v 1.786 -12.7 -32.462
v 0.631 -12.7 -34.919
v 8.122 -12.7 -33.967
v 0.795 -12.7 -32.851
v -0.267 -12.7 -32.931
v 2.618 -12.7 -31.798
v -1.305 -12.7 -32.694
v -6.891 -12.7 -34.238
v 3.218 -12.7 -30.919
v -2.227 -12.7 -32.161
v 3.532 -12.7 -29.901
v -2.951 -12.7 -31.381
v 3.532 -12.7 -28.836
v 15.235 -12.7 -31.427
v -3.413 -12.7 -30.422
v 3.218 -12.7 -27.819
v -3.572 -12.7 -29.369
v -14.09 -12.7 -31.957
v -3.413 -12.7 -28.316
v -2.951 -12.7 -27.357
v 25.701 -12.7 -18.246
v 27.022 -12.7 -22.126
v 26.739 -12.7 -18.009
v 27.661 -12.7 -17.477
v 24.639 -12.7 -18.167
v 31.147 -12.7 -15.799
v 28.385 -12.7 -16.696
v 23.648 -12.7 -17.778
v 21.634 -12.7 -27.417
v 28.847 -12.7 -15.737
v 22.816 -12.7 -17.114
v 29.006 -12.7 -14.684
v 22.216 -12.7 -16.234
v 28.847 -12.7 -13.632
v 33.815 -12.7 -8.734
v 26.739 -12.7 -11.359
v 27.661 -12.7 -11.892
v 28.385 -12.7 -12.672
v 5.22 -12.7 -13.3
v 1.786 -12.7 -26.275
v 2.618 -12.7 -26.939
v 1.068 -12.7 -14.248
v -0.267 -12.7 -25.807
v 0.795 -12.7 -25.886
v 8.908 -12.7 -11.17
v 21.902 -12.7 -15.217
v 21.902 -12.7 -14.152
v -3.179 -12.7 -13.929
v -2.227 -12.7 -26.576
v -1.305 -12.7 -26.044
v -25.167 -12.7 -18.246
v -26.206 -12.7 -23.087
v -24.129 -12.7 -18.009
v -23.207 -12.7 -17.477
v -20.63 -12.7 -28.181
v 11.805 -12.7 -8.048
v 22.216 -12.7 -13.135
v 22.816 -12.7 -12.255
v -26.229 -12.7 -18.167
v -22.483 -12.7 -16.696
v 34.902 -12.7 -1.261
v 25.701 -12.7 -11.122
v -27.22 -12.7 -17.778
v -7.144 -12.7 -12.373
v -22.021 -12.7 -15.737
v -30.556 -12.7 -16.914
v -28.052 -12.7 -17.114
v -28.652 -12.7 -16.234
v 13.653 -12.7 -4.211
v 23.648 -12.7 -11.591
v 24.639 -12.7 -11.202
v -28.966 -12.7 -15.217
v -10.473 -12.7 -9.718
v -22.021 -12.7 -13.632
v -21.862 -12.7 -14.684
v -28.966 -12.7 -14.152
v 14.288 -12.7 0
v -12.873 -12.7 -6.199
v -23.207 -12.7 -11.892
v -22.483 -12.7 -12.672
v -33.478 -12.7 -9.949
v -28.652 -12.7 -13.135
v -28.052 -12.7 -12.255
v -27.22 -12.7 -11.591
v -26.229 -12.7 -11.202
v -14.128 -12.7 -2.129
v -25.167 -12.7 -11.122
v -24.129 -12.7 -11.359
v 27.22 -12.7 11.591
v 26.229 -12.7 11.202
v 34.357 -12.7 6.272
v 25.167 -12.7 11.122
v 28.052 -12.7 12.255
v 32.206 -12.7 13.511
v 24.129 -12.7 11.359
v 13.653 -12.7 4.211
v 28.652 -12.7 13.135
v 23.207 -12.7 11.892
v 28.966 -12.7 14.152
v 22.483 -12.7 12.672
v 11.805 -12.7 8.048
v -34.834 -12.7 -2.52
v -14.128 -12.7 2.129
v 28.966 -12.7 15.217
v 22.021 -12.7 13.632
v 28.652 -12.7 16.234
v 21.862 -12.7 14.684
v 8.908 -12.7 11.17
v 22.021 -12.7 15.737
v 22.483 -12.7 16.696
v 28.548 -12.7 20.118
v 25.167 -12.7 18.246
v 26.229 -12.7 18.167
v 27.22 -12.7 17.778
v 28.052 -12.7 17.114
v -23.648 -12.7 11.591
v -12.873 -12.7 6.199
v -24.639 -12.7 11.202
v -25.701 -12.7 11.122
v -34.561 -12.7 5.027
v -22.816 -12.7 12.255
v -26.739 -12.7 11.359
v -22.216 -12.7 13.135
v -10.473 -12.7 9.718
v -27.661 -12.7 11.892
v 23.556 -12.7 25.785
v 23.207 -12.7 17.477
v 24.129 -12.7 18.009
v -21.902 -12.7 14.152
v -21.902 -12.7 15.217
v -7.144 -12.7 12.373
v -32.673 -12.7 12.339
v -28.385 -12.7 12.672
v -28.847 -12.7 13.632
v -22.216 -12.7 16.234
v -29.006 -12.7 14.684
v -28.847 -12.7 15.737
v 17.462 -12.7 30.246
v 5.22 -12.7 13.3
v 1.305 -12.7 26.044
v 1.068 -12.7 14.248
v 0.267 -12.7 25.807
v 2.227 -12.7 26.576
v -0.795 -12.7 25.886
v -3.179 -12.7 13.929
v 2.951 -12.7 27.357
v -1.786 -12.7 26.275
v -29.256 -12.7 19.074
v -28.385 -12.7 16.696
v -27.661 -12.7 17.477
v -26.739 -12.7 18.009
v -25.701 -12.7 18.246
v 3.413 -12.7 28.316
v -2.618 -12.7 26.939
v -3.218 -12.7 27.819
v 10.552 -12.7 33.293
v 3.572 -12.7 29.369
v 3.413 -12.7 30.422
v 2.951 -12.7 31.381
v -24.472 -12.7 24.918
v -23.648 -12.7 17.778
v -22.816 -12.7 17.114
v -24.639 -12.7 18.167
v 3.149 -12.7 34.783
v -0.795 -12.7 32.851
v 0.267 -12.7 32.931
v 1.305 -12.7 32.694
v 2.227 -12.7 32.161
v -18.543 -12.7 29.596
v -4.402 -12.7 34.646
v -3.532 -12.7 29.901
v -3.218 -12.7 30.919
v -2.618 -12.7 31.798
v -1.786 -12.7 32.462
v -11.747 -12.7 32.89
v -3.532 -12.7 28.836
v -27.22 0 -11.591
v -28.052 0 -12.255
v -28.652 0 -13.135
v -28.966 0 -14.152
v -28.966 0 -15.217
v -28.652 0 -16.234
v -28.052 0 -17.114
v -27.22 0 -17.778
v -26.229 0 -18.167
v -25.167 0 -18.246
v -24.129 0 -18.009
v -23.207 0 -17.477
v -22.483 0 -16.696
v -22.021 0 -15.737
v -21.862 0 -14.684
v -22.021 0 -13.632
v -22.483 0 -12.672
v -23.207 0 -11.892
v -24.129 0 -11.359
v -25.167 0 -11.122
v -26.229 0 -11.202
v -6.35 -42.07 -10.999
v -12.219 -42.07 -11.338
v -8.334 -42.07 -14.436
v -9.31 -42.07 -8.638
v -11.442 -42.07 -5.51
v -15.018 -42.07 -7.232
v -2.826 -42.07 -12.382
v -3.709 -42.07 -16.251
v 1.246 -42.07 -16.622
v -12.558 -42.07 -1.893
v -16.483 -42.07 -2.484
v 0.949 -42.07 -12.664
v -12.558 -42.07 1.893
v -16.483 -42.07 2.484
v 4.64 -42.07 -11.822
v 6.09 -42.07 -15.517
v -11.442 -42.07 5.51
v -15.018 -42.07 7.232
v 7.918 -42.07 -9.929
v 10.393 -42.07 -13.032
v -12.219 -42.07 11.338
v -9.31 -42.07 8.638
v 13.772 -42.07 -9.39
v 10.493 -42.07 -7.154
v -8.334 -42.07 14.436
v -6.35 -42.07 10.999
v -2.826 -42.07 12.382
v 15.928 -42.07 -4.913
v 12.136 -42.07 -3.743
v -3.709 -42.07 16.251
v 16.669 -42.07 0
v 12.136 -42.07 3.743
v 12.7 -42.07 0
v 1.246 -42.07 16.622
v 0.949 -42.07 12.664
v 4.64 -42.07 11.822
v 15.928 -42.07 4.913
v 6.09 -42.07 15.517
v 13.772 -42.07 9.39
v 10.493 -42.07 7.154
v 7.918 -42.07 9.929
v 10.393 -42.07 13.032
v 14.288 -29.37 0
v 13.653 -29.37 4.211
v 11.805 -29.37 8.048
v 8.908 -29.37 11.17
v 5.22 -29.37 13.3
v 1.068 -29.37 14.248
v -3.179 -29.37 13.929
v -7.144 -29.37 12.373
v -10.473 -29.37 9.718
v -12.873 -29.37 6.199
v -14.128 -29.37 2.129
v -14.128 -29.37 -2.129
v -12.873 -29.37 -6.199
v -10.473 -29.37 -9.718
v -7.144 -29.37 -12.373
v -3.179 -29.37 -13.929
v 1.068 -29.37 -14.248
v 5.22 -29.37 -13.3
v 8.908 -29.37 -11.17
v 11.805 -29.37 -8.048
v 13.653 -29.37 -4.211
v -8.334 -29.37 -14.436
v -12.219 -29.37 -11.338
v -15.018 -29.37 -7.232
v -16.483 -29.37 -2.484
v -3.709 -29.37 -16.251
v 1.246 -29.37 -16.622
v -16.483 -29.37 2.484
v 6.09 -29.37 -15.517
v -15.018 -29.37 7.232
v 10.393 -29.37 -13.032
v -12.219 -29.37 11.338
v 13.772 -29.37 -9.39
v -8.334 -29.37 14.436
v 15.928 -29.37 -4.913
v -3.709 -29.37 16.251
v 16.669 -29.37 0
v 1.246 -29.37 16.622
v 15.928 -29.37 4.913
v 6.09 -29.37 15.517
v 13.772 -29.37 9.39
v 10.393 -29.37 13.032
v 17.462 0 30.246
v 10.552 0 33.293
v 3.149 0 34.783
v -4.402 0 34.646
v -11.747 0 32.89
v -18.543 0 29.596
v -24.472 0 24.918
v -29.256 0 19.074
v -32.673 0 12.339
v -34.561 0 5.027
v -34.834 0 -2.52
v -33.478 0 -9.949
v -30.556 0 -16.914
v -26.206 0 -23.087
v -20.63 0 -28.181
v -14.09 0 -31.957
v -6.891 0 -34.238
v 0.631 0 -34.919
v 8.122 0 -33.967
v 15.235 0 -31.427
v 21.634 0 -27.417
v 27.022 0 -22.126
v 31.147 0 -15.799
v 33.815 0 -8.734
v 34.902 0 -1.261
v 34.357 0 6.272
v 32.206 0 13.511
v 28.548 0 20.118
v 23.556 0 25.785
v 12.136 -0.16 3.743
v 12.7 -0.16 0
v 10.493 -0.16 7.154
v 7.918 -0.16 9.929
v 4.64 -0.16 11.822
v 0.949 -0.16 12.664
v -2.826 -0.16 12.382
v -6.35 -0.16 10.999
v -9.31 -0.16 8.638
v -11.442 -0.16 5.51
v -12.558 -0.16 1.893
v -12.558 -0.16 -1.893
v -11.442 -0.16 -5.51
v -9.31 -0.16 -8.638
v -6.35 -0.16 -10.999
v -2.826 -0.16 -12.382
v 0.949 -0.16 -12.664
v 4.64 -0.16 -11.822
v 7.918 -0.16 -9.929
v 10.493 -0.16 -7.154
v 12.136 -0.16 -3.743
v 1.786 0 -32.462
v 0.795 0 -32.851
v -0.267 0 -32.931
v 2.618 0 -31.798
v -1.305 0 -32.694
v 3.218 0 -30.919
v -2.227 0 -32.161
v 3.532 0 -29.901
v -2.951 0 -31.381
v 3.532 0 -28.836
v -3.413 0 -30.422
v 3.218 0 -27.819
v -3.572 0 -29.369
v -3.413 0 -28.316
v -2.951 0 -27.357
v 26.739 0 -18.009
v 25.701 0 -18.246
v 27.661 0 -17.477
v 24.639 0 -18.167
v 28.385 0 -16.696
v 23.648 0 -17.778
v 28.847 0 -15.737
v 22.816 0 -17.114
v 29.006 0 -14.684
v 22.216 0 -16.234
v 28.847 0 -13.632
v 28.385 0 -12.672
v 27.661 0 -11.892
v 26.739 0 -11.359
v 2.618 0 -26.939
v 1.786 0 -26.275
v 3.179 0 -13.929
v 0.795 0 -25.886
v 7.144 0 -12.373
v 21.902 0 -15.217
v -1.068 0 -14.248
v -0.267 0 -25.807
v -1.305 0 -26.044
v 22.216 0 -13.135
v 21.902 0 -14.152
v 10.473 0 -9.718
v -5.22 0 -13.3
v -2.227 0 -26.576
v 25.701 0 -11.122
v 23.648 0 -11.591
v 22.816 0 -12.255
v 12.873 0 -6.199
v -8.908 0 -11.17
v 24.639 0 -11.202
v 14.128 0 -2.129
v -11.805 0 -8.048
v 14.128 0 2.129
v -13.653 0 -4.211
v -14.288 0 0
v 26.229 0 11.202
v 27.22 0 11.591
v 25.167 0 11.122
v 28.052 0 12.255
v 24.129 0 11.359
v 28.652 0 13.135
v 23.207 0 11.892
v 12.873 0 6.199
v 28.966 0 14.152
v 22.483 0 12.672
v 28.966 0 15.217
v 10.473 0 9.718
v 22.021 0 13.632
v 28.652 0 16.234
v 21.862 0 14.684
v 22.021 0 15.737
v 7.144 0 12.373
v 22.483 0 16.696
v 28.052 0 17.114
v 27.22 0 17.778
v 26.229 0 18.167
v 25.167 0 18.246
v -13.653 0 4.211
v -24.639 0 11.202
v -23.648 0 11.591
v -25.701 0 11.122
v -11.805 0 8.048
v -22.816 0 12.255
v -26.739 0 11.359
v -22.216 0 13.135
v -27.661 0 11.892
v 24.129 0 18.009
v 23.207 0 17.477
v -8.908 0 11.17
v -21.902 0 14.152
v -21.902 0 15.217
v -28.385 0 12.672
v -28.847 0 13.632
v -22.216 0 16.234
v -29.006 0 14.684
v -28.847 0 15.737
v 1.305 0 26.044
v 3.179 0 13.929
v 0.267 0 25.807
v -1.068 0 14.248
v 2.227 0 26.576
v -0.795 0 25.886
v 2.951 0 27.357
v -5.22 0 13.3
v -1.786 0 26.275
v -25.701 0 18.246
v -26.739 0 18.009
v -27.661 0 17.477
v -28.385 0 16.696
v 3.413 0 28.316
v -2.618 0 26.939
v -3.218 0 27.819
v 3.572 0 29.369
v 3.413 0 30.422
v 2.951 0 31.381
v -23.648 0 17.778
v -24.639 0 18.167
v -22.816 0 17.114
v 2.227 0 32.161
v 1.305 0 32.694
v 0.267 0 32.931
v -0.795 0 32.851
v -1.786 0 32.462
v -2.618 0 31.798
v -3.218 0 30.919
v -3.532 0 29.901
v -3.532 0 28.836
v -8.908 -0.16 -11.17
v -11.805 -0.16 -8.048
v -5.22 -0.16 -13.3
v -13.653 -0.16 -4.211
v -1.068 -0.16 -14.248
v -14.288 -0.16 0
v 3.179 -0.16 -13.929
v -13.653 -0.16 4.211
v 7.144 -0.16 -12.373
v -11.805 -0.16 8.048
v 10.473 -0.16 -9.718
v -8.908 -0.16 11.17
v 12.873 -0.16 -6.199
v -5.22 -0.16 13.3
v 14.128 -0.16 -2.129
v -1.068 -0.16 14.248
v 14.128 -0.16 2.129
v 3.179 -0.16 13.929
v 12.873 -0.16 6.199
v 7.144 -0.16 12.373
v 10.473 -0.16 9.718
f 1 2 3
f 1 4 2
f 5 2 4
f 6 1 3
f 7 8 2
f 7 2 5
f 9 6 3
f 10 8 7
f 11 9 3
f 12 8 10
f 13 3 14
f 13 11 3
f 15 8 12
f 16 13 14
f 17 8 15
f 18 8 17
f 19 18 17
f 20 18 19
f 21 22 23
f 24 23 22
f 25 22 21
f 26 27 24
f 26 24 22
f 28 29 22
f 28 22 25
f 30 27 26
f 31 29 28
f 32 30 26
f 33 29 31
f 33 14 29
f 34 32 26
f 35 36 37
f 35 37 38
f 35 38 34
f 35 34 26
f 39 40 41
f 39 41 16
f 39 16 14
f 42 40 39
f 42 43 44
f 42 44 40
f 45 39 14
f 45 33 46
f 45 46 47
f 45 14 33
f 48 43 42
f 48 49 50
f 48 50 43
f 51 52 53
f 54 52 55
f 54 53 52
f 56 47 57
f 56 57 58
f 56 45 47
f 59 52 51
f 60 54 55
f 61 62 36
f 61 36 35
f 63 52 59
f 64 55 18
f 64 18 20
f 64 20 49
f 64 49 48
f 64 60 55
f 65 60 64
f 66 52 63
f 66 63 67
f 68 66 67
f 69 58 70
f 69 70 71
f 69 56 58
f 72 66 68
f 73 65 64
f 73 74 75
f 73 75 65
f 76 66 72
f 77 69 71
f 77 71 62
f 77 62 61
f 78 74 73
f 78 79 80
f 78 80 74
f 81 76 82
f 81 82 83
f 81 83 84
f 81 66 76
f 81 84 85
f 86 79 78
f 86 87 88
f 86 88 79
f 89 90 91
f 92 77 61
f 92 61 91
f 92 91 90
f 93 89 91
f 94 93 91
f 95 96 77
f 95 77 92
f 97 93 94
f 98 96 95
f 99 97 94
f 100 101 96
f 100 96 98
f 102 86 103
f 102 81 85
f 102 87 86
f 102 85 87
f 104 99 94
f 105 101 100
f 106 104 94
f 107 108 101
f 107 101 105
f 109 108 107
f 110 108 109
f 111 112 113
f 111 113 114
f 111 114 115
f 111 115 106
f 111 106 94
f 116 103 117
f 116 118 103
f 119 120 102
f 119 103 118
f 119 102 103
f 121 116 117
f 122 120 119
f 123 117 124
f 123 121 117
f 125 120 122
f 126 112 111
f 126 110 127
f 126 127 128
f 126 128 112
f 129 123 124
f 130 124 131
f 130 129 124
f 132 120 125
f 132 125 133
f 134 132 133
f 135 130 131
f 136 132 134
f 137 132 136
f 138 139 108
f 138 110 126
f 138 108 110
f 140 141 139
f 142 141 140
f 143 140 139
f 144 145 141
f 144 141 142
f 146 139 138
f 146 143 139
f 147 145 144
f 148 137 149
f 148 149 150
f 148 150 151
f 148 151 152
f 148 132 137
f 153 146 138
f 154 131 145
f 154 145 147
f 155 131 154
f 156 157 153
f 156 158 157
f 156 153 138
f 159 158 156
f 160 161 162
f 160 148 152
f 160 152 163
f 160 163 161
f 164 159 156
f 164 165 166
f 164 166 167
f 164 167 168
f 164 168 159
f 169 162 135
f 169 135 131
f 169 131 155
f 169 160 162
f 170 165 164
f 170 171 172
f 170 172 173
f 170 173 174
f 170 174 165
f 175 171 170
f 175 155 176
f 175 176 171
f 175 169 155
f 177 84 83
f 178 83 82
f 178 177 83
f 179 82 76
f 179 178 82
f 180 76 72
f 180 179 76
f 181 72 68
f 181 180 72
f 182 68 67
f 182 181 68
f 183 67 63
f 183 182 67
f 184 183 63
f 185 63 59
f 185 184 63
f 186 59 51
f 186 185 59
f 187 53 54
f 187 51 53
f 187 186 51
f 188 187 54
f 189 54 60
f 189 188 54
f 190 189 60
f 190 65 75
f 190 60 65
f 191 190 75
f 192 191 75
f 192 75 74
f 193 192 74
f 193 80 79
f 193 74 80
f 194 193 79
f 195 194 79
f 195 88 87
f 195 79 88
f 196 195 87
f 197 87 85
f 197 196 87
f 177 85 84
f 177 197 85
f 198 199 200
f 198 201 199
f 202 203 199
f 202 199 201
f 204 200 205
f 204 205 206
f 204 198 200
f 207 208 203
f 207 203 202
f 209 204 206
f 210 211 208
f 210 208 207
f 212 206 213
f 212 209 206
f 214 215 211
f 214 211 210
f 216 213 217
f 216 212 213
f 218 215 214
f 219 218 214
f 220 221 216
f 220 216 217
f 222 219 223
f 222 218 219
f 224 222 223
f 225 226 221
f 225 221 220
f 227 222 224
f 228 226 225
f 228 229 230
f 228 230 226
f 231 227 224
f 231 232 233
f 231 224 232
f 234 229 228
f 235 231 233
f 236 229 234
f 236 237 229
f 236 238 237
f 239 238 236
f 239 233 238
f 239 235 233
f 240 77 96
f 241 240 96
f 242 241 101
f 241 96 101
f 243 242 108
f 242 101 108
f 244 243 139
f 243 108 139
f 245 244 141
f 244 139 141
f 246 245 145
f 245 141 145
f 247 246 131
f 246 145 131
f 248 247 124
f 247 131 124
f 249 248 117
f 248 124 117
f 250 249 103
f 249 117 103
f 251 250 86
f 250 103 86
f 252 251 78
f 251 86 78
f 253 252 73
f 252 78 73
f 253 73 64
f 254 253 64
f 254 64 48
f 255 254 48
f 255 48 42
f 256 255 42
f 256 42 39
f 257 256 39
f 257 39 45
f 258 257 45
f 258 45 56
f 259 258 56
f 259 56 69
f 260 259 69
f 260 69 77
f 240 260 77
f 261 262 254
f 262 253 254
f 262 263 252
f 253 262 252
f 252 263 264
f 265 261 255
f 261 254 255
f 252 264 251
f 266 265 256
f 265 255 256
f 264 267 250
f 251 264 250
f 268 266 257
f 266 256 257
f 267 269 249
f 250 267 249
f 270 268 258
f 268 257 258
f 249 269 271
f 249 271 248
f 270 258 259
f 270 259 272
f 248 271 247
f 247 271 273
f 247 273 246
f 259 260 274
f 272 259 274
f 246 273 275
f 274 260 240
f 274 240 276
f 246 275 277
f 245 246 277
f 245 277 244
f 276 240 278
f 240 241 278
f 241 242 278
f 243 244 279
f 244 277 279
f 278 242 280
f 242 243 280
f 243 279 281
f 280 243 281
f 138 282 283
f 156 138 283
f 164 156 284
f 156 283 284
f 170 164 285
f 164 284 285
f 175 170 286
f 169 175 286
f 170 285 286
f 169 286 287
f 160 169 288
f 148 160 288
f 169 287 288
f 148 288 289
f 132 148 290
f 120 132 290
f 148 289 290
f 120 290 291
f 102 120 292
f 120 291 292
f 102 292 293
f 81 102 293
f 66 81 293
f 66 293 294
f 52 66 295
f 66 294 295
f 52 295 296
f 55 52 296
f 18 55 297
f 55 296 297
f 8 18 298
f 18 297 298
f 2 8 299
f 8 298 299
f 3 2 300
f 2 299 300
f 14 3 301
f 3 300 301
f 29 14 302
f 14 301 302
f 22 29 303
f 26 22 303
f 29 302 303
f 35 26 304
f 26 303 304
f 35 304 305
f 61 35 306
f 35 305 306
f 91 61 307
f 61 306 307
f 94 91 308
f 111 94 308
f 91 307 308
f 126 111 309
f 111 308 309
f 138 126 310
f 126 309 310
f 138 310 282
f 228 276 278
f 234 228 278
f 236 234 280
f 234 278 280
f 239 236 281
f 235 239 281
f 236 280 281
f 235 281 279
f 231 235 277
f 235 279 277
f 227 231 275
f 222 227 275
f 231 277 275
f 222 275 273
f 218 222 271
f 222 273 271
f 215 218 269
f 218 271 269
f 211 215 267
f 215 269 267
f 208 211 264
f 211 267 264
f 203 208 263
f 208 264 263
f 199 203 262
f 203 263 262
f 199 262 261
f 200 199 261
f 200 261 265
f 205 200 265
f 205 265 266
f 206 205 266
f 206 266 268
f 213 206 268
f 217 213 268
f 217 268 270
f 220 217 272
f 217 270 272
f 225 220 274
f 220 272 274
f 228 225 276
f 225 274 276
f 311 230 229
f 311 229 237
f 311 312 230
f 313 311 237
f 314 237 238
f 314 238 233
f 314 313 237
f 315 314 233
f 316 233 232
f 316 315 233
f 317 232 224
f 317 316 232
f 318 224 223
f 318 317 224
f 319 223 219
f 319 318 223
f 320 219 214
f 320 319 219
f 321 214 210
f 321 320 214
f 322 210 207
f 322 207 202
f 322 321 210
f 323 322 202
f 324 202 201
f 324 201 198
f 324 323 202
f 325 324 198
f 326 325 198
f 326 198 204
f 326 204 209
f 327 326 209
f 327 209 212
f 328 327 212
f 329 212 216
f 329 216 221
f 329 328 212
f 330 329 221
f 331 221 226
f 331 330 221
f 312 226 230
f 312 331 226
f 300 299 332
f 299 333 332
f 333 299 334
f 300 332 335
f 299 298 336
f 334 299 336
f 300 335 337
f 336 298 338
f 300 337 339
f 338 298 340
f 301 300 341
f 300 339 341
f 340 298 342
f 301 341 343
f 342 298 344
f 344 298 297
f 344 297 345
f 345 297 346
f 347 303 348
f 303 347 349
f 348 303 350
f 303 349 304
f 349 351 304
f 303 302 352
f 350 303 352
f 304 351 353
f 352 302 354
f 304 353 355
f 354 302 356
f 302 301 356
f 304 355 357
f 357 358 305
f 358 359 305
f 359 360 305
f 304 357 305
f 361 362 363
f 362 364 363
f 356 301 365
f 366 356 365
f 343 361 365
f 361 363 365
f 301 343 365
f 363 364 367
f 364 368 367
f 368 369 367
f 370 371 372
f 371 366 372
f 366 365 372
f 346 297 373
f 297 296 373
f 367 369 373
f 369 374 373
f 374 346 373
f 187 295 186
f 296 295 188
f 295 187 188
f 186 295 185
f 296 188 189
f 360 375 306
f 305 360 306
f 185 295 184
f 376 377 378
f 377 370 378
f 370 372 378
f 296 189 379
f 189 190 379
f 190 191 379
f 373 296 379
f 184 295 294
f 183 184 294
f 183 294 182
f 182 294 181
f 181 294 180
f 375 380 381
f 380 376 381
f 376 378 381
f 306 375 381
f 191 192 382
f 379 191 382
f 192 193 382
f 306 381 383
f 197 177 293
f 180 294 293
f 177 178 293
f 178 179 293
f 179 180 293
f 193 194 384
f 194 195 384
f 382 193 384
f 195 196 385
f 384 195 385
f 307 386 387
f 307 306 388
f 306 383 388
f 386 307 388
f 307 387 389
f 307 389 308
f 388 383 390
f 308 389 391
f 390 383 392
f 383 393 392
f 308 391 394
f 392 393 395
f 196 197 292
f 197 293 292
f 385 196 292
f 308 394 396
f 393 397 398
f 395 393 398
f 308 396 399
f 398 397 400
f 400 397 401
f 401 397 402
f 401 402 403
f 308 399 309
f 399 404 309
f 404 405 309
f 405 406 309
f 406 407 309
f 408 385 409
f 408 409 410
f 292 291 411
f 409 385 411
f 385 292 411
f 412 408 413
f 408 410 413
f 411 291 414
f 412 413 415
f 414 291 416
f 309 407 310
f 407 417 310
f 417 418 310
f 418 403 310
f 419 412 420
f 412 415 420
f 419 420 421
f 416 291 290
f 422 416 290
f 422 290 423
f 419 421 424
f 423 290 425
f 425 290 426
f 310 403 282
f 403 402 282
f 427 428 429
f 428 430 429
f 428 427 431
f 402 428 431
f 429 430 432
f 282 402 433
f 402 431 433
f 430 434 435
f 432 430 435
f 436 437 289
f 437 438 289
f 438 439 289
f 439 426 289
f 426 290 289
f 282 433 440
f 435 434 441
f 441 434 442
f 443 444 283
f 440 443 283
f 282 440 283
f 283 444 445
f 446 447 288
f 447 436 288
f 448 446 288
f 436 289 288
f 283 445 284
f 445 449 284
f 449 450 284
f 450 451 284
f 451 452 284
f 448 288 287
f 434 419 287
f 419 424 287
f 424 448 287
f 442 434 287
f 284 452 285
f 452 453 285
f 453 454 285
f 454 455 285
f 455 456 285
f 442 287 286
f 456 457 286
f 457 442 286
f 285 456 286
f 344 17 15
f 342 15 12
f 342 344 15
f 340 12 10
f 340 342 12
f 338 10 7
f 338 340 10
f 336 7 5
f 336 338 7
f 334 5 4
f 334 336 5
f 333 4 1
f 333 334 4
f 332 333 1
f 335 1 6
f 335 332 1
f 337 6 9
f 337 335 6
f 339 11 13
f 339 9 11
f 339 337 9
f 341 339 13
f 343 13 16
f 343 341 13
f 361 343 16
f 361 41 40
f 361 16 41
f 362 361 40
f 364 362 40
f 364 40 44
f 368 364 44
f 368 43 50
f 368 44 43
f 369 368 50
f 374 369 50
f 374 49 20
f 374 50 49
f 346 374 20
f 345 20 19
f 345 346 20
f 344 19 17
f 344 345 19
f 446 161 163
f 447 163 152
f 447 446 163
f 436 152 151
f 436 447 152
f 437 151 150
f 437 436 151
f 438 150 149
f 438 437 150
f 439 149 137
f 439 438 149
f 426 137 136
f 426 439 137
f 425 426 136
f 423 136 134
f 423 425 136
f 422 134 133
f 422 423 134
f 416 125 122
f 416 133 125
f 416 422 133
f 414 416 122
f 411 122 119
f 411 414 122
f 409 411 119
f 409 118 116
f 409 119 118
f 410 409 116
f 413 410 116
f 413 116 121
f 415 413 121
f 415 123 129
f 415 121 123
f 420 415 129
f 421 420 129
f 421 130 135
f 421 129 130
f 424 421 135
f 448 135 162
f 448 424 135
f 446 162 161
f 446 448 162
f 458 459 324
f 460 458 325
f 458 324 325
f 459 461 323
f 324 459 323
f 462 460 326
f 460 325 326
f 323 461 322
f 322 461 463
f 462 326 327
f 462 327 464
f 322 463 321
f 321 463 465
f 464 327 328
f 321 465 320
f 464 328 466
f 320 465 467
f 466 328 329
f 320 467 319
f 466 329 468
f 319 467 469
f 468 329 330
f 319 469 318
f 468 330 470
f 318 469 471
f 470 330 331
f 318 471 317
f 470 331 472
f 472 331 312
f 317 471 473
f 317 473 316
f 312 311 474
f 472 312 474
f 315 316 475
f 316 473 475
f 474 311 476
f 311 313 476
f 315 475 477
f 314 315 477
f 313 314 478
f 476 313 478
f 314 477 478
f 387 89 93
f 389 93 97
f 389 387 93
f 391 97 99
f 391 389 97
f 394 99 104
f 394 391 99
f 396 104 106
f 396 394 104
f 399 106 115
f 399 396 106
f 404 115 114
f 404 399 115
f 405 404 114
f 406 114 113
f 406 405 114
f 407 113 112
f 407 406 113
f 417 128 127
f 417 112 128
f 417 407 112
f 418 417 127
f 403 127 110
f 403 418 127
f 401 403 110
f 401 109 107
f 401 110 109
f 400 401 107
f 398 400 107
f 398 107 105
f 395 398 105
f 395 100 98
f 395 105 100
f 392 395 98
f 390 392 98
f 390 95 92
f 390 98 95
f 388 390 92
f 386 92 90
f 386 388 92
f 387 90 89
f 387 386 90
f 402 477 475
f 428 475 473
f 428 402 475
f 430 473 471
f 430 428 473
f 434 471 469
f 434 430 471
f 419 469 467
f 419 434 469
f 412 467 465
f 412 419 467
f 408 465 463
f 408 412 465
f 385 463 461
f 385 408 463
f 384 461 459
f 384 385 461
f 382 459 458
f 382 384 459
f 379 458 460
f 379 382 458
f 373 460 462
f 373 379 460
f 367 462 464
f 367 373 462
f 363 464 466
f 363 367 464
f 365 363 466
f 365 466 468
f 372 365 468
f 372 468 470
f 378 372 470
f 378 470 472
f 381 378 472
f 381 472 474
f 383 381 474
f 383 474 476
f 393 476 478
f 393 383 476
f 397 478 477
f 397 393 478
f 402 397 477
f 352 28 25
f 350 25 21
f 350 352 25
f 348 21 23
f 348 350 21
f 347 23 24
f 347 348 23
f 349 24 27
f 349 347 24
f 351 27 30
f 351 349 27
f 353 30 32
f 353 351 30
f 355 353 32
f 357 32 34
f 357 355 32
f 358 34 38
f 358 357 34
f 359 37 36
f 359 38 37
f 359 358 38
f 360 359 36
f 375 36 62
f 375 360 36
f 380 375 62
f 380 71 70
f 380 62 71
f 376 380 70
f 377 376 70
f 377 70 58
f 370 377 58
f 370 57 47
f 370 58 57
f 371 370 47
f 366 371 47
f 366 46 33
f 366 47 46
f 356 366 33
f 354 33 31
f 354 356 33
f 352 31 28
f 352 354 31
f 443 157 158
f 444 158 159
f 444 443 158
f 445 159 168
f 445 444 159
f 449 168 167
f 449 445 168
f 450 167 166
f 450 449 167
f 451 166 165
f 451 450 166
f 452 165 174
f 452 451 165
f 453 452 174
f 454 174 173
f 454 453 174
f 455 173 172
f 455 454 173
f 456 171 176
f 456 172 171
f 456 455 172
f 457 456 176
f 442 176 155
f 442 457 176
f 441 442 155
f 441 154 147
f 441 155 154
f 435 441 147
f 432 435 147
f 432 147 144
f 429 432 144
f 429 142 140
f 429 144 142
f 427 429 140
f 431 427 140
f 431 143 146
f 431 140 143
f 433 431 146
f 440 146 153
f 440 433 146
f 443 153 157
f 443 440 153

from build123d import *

# Parameters (mm, degrees)
SKETCH015_R            = 14.2875
SKETCH015_R_2          = 12.7
PAD015_DEPTH           = 29.21
SKETCH016_R            = 16.66875
SKETCH016_R_2          = 12.7
PAD016_DEPTH           = 12.7
SKETCH014_R            = 3.571875
PAD014_DEPTH           = 13
SKETCH013_R            = 34.925
SKETCH013_R_2          = 14.2875
PAD013_DEPTH           = 12.7
CUT006_PLACEMENT_ANGLE = 60
CUT007_PLACEMENT_ANGLE = 60
CUT008_PLACEMENT_ANGLE = 60
CUT009_PLACEMENT_ANGLE = 60
CUT010_PLACEMENT_ANGLE = 60


with BuildPart() as body015:
    # Sketch015 → Pad015 (new body)
    with BuildSketch(Plane.XZ):
        Circle(SKETCH015_R)
        Circle(SKETCH015_R_2, mode=Mode.SUBTRACT)
    extrude(amount=PAD015_DEPTH)


with BuildPart() as body015_1:
    # Body015 placement: moved
    add(body015.part.moved(Location((0, -0.16, 0))))


with BuildPart() as body016:
    # Sketch016 → Pad016 (new body)
    with BuildSketch(Plane.XZ):
        Circle(SKETCH016_R)
        Circle(SKETCH016_R_2, mode=Mode.SUBTRACT)
    extrude(amount=PAD016_DEPTH)


with BuildPart() as body016_1:
    # Body016 placement: moved
    add(body016.part.moved(Location((0, -29.37, 0))))


with BuildPart() as body014:
    # Sketch014 → Pad014 (new body)
    with BuildSketch(Plane.XZ):
        with Locations((0, 29.36875)):
            Circle(SKETCH014_R)
    extrude(amount=PAD014_DEPTH)


with BuildPart() as fusion001:
    # Sketch013 → Pad013 (new body)
    with BuildSketch(Plane.XZ):
        Circle(SKETCH013_R)
        Circle(SKETCH013_R_2, mode=Mode.SUBTRACT)
    extrude(amount=PAD013_DEPTH)

    # Cut006: cut Body014
    add(body014.part, mode=Mode.SUBTRACT)


with BuildPart() as fusion001_1:
    # Cut006 placement: moved
    add(fusion001.part.rotate(Axis((0, 0, 0), (0, 1, 0)), CUT006_PLACEMENT_ANGLE))

    # Cut007: cut Body014
    add(body014.part, mode=Mode.SUBTRACT)


with BuildPart() as fusion001_2:
    # Cut007 placement: moved
    add(fusion001_1.part.rotate(Axis((0, 0, 0), (0, 1, 0)), CUT007_PLACEMENT_ANGLE))

    # Cut008: cut Body014
    add(body014.part, mode=Mode.SUBTRACT)


with BuildPart() as fusion001_3:
    # Cut008 placement: moved
    add(fusion001_2.part.rotate(Axis((0, 0, 0), (0, 1, 0)), CUT008_PLACEMENT_ANGLE))

    # Cut009: cut Body014
    add(body014.part, mode=Mode.SUBTRACT)


with BuildPart() as fusion001_4:
    # Cut009 placement: moved
    add(fusion001_3.part.rotate(Axis((0, 0, 0), (0, 1, 0)), CUT009_PLACEMENT_ANGLE))

    # Cut010: cut Body014
    add(body014.part, mode=Mode.SUBTRACT)


with BuildPart() as fusion001_5:
    # Cut010 placement: moved
    add(fusion001_4.part.rotate(Axis((0, 0, 0), (0, 1, 0)), CUT010_PLACEMENT_ANGLE))

    # Cut011: cut Body014
    add(body014.part, mode=Mode.SUBTRACT)

    # Fusion001: union Body015, Body016
    add(body015_1.part)
    add(body016_1.part)


solid = fusion001_5.part
